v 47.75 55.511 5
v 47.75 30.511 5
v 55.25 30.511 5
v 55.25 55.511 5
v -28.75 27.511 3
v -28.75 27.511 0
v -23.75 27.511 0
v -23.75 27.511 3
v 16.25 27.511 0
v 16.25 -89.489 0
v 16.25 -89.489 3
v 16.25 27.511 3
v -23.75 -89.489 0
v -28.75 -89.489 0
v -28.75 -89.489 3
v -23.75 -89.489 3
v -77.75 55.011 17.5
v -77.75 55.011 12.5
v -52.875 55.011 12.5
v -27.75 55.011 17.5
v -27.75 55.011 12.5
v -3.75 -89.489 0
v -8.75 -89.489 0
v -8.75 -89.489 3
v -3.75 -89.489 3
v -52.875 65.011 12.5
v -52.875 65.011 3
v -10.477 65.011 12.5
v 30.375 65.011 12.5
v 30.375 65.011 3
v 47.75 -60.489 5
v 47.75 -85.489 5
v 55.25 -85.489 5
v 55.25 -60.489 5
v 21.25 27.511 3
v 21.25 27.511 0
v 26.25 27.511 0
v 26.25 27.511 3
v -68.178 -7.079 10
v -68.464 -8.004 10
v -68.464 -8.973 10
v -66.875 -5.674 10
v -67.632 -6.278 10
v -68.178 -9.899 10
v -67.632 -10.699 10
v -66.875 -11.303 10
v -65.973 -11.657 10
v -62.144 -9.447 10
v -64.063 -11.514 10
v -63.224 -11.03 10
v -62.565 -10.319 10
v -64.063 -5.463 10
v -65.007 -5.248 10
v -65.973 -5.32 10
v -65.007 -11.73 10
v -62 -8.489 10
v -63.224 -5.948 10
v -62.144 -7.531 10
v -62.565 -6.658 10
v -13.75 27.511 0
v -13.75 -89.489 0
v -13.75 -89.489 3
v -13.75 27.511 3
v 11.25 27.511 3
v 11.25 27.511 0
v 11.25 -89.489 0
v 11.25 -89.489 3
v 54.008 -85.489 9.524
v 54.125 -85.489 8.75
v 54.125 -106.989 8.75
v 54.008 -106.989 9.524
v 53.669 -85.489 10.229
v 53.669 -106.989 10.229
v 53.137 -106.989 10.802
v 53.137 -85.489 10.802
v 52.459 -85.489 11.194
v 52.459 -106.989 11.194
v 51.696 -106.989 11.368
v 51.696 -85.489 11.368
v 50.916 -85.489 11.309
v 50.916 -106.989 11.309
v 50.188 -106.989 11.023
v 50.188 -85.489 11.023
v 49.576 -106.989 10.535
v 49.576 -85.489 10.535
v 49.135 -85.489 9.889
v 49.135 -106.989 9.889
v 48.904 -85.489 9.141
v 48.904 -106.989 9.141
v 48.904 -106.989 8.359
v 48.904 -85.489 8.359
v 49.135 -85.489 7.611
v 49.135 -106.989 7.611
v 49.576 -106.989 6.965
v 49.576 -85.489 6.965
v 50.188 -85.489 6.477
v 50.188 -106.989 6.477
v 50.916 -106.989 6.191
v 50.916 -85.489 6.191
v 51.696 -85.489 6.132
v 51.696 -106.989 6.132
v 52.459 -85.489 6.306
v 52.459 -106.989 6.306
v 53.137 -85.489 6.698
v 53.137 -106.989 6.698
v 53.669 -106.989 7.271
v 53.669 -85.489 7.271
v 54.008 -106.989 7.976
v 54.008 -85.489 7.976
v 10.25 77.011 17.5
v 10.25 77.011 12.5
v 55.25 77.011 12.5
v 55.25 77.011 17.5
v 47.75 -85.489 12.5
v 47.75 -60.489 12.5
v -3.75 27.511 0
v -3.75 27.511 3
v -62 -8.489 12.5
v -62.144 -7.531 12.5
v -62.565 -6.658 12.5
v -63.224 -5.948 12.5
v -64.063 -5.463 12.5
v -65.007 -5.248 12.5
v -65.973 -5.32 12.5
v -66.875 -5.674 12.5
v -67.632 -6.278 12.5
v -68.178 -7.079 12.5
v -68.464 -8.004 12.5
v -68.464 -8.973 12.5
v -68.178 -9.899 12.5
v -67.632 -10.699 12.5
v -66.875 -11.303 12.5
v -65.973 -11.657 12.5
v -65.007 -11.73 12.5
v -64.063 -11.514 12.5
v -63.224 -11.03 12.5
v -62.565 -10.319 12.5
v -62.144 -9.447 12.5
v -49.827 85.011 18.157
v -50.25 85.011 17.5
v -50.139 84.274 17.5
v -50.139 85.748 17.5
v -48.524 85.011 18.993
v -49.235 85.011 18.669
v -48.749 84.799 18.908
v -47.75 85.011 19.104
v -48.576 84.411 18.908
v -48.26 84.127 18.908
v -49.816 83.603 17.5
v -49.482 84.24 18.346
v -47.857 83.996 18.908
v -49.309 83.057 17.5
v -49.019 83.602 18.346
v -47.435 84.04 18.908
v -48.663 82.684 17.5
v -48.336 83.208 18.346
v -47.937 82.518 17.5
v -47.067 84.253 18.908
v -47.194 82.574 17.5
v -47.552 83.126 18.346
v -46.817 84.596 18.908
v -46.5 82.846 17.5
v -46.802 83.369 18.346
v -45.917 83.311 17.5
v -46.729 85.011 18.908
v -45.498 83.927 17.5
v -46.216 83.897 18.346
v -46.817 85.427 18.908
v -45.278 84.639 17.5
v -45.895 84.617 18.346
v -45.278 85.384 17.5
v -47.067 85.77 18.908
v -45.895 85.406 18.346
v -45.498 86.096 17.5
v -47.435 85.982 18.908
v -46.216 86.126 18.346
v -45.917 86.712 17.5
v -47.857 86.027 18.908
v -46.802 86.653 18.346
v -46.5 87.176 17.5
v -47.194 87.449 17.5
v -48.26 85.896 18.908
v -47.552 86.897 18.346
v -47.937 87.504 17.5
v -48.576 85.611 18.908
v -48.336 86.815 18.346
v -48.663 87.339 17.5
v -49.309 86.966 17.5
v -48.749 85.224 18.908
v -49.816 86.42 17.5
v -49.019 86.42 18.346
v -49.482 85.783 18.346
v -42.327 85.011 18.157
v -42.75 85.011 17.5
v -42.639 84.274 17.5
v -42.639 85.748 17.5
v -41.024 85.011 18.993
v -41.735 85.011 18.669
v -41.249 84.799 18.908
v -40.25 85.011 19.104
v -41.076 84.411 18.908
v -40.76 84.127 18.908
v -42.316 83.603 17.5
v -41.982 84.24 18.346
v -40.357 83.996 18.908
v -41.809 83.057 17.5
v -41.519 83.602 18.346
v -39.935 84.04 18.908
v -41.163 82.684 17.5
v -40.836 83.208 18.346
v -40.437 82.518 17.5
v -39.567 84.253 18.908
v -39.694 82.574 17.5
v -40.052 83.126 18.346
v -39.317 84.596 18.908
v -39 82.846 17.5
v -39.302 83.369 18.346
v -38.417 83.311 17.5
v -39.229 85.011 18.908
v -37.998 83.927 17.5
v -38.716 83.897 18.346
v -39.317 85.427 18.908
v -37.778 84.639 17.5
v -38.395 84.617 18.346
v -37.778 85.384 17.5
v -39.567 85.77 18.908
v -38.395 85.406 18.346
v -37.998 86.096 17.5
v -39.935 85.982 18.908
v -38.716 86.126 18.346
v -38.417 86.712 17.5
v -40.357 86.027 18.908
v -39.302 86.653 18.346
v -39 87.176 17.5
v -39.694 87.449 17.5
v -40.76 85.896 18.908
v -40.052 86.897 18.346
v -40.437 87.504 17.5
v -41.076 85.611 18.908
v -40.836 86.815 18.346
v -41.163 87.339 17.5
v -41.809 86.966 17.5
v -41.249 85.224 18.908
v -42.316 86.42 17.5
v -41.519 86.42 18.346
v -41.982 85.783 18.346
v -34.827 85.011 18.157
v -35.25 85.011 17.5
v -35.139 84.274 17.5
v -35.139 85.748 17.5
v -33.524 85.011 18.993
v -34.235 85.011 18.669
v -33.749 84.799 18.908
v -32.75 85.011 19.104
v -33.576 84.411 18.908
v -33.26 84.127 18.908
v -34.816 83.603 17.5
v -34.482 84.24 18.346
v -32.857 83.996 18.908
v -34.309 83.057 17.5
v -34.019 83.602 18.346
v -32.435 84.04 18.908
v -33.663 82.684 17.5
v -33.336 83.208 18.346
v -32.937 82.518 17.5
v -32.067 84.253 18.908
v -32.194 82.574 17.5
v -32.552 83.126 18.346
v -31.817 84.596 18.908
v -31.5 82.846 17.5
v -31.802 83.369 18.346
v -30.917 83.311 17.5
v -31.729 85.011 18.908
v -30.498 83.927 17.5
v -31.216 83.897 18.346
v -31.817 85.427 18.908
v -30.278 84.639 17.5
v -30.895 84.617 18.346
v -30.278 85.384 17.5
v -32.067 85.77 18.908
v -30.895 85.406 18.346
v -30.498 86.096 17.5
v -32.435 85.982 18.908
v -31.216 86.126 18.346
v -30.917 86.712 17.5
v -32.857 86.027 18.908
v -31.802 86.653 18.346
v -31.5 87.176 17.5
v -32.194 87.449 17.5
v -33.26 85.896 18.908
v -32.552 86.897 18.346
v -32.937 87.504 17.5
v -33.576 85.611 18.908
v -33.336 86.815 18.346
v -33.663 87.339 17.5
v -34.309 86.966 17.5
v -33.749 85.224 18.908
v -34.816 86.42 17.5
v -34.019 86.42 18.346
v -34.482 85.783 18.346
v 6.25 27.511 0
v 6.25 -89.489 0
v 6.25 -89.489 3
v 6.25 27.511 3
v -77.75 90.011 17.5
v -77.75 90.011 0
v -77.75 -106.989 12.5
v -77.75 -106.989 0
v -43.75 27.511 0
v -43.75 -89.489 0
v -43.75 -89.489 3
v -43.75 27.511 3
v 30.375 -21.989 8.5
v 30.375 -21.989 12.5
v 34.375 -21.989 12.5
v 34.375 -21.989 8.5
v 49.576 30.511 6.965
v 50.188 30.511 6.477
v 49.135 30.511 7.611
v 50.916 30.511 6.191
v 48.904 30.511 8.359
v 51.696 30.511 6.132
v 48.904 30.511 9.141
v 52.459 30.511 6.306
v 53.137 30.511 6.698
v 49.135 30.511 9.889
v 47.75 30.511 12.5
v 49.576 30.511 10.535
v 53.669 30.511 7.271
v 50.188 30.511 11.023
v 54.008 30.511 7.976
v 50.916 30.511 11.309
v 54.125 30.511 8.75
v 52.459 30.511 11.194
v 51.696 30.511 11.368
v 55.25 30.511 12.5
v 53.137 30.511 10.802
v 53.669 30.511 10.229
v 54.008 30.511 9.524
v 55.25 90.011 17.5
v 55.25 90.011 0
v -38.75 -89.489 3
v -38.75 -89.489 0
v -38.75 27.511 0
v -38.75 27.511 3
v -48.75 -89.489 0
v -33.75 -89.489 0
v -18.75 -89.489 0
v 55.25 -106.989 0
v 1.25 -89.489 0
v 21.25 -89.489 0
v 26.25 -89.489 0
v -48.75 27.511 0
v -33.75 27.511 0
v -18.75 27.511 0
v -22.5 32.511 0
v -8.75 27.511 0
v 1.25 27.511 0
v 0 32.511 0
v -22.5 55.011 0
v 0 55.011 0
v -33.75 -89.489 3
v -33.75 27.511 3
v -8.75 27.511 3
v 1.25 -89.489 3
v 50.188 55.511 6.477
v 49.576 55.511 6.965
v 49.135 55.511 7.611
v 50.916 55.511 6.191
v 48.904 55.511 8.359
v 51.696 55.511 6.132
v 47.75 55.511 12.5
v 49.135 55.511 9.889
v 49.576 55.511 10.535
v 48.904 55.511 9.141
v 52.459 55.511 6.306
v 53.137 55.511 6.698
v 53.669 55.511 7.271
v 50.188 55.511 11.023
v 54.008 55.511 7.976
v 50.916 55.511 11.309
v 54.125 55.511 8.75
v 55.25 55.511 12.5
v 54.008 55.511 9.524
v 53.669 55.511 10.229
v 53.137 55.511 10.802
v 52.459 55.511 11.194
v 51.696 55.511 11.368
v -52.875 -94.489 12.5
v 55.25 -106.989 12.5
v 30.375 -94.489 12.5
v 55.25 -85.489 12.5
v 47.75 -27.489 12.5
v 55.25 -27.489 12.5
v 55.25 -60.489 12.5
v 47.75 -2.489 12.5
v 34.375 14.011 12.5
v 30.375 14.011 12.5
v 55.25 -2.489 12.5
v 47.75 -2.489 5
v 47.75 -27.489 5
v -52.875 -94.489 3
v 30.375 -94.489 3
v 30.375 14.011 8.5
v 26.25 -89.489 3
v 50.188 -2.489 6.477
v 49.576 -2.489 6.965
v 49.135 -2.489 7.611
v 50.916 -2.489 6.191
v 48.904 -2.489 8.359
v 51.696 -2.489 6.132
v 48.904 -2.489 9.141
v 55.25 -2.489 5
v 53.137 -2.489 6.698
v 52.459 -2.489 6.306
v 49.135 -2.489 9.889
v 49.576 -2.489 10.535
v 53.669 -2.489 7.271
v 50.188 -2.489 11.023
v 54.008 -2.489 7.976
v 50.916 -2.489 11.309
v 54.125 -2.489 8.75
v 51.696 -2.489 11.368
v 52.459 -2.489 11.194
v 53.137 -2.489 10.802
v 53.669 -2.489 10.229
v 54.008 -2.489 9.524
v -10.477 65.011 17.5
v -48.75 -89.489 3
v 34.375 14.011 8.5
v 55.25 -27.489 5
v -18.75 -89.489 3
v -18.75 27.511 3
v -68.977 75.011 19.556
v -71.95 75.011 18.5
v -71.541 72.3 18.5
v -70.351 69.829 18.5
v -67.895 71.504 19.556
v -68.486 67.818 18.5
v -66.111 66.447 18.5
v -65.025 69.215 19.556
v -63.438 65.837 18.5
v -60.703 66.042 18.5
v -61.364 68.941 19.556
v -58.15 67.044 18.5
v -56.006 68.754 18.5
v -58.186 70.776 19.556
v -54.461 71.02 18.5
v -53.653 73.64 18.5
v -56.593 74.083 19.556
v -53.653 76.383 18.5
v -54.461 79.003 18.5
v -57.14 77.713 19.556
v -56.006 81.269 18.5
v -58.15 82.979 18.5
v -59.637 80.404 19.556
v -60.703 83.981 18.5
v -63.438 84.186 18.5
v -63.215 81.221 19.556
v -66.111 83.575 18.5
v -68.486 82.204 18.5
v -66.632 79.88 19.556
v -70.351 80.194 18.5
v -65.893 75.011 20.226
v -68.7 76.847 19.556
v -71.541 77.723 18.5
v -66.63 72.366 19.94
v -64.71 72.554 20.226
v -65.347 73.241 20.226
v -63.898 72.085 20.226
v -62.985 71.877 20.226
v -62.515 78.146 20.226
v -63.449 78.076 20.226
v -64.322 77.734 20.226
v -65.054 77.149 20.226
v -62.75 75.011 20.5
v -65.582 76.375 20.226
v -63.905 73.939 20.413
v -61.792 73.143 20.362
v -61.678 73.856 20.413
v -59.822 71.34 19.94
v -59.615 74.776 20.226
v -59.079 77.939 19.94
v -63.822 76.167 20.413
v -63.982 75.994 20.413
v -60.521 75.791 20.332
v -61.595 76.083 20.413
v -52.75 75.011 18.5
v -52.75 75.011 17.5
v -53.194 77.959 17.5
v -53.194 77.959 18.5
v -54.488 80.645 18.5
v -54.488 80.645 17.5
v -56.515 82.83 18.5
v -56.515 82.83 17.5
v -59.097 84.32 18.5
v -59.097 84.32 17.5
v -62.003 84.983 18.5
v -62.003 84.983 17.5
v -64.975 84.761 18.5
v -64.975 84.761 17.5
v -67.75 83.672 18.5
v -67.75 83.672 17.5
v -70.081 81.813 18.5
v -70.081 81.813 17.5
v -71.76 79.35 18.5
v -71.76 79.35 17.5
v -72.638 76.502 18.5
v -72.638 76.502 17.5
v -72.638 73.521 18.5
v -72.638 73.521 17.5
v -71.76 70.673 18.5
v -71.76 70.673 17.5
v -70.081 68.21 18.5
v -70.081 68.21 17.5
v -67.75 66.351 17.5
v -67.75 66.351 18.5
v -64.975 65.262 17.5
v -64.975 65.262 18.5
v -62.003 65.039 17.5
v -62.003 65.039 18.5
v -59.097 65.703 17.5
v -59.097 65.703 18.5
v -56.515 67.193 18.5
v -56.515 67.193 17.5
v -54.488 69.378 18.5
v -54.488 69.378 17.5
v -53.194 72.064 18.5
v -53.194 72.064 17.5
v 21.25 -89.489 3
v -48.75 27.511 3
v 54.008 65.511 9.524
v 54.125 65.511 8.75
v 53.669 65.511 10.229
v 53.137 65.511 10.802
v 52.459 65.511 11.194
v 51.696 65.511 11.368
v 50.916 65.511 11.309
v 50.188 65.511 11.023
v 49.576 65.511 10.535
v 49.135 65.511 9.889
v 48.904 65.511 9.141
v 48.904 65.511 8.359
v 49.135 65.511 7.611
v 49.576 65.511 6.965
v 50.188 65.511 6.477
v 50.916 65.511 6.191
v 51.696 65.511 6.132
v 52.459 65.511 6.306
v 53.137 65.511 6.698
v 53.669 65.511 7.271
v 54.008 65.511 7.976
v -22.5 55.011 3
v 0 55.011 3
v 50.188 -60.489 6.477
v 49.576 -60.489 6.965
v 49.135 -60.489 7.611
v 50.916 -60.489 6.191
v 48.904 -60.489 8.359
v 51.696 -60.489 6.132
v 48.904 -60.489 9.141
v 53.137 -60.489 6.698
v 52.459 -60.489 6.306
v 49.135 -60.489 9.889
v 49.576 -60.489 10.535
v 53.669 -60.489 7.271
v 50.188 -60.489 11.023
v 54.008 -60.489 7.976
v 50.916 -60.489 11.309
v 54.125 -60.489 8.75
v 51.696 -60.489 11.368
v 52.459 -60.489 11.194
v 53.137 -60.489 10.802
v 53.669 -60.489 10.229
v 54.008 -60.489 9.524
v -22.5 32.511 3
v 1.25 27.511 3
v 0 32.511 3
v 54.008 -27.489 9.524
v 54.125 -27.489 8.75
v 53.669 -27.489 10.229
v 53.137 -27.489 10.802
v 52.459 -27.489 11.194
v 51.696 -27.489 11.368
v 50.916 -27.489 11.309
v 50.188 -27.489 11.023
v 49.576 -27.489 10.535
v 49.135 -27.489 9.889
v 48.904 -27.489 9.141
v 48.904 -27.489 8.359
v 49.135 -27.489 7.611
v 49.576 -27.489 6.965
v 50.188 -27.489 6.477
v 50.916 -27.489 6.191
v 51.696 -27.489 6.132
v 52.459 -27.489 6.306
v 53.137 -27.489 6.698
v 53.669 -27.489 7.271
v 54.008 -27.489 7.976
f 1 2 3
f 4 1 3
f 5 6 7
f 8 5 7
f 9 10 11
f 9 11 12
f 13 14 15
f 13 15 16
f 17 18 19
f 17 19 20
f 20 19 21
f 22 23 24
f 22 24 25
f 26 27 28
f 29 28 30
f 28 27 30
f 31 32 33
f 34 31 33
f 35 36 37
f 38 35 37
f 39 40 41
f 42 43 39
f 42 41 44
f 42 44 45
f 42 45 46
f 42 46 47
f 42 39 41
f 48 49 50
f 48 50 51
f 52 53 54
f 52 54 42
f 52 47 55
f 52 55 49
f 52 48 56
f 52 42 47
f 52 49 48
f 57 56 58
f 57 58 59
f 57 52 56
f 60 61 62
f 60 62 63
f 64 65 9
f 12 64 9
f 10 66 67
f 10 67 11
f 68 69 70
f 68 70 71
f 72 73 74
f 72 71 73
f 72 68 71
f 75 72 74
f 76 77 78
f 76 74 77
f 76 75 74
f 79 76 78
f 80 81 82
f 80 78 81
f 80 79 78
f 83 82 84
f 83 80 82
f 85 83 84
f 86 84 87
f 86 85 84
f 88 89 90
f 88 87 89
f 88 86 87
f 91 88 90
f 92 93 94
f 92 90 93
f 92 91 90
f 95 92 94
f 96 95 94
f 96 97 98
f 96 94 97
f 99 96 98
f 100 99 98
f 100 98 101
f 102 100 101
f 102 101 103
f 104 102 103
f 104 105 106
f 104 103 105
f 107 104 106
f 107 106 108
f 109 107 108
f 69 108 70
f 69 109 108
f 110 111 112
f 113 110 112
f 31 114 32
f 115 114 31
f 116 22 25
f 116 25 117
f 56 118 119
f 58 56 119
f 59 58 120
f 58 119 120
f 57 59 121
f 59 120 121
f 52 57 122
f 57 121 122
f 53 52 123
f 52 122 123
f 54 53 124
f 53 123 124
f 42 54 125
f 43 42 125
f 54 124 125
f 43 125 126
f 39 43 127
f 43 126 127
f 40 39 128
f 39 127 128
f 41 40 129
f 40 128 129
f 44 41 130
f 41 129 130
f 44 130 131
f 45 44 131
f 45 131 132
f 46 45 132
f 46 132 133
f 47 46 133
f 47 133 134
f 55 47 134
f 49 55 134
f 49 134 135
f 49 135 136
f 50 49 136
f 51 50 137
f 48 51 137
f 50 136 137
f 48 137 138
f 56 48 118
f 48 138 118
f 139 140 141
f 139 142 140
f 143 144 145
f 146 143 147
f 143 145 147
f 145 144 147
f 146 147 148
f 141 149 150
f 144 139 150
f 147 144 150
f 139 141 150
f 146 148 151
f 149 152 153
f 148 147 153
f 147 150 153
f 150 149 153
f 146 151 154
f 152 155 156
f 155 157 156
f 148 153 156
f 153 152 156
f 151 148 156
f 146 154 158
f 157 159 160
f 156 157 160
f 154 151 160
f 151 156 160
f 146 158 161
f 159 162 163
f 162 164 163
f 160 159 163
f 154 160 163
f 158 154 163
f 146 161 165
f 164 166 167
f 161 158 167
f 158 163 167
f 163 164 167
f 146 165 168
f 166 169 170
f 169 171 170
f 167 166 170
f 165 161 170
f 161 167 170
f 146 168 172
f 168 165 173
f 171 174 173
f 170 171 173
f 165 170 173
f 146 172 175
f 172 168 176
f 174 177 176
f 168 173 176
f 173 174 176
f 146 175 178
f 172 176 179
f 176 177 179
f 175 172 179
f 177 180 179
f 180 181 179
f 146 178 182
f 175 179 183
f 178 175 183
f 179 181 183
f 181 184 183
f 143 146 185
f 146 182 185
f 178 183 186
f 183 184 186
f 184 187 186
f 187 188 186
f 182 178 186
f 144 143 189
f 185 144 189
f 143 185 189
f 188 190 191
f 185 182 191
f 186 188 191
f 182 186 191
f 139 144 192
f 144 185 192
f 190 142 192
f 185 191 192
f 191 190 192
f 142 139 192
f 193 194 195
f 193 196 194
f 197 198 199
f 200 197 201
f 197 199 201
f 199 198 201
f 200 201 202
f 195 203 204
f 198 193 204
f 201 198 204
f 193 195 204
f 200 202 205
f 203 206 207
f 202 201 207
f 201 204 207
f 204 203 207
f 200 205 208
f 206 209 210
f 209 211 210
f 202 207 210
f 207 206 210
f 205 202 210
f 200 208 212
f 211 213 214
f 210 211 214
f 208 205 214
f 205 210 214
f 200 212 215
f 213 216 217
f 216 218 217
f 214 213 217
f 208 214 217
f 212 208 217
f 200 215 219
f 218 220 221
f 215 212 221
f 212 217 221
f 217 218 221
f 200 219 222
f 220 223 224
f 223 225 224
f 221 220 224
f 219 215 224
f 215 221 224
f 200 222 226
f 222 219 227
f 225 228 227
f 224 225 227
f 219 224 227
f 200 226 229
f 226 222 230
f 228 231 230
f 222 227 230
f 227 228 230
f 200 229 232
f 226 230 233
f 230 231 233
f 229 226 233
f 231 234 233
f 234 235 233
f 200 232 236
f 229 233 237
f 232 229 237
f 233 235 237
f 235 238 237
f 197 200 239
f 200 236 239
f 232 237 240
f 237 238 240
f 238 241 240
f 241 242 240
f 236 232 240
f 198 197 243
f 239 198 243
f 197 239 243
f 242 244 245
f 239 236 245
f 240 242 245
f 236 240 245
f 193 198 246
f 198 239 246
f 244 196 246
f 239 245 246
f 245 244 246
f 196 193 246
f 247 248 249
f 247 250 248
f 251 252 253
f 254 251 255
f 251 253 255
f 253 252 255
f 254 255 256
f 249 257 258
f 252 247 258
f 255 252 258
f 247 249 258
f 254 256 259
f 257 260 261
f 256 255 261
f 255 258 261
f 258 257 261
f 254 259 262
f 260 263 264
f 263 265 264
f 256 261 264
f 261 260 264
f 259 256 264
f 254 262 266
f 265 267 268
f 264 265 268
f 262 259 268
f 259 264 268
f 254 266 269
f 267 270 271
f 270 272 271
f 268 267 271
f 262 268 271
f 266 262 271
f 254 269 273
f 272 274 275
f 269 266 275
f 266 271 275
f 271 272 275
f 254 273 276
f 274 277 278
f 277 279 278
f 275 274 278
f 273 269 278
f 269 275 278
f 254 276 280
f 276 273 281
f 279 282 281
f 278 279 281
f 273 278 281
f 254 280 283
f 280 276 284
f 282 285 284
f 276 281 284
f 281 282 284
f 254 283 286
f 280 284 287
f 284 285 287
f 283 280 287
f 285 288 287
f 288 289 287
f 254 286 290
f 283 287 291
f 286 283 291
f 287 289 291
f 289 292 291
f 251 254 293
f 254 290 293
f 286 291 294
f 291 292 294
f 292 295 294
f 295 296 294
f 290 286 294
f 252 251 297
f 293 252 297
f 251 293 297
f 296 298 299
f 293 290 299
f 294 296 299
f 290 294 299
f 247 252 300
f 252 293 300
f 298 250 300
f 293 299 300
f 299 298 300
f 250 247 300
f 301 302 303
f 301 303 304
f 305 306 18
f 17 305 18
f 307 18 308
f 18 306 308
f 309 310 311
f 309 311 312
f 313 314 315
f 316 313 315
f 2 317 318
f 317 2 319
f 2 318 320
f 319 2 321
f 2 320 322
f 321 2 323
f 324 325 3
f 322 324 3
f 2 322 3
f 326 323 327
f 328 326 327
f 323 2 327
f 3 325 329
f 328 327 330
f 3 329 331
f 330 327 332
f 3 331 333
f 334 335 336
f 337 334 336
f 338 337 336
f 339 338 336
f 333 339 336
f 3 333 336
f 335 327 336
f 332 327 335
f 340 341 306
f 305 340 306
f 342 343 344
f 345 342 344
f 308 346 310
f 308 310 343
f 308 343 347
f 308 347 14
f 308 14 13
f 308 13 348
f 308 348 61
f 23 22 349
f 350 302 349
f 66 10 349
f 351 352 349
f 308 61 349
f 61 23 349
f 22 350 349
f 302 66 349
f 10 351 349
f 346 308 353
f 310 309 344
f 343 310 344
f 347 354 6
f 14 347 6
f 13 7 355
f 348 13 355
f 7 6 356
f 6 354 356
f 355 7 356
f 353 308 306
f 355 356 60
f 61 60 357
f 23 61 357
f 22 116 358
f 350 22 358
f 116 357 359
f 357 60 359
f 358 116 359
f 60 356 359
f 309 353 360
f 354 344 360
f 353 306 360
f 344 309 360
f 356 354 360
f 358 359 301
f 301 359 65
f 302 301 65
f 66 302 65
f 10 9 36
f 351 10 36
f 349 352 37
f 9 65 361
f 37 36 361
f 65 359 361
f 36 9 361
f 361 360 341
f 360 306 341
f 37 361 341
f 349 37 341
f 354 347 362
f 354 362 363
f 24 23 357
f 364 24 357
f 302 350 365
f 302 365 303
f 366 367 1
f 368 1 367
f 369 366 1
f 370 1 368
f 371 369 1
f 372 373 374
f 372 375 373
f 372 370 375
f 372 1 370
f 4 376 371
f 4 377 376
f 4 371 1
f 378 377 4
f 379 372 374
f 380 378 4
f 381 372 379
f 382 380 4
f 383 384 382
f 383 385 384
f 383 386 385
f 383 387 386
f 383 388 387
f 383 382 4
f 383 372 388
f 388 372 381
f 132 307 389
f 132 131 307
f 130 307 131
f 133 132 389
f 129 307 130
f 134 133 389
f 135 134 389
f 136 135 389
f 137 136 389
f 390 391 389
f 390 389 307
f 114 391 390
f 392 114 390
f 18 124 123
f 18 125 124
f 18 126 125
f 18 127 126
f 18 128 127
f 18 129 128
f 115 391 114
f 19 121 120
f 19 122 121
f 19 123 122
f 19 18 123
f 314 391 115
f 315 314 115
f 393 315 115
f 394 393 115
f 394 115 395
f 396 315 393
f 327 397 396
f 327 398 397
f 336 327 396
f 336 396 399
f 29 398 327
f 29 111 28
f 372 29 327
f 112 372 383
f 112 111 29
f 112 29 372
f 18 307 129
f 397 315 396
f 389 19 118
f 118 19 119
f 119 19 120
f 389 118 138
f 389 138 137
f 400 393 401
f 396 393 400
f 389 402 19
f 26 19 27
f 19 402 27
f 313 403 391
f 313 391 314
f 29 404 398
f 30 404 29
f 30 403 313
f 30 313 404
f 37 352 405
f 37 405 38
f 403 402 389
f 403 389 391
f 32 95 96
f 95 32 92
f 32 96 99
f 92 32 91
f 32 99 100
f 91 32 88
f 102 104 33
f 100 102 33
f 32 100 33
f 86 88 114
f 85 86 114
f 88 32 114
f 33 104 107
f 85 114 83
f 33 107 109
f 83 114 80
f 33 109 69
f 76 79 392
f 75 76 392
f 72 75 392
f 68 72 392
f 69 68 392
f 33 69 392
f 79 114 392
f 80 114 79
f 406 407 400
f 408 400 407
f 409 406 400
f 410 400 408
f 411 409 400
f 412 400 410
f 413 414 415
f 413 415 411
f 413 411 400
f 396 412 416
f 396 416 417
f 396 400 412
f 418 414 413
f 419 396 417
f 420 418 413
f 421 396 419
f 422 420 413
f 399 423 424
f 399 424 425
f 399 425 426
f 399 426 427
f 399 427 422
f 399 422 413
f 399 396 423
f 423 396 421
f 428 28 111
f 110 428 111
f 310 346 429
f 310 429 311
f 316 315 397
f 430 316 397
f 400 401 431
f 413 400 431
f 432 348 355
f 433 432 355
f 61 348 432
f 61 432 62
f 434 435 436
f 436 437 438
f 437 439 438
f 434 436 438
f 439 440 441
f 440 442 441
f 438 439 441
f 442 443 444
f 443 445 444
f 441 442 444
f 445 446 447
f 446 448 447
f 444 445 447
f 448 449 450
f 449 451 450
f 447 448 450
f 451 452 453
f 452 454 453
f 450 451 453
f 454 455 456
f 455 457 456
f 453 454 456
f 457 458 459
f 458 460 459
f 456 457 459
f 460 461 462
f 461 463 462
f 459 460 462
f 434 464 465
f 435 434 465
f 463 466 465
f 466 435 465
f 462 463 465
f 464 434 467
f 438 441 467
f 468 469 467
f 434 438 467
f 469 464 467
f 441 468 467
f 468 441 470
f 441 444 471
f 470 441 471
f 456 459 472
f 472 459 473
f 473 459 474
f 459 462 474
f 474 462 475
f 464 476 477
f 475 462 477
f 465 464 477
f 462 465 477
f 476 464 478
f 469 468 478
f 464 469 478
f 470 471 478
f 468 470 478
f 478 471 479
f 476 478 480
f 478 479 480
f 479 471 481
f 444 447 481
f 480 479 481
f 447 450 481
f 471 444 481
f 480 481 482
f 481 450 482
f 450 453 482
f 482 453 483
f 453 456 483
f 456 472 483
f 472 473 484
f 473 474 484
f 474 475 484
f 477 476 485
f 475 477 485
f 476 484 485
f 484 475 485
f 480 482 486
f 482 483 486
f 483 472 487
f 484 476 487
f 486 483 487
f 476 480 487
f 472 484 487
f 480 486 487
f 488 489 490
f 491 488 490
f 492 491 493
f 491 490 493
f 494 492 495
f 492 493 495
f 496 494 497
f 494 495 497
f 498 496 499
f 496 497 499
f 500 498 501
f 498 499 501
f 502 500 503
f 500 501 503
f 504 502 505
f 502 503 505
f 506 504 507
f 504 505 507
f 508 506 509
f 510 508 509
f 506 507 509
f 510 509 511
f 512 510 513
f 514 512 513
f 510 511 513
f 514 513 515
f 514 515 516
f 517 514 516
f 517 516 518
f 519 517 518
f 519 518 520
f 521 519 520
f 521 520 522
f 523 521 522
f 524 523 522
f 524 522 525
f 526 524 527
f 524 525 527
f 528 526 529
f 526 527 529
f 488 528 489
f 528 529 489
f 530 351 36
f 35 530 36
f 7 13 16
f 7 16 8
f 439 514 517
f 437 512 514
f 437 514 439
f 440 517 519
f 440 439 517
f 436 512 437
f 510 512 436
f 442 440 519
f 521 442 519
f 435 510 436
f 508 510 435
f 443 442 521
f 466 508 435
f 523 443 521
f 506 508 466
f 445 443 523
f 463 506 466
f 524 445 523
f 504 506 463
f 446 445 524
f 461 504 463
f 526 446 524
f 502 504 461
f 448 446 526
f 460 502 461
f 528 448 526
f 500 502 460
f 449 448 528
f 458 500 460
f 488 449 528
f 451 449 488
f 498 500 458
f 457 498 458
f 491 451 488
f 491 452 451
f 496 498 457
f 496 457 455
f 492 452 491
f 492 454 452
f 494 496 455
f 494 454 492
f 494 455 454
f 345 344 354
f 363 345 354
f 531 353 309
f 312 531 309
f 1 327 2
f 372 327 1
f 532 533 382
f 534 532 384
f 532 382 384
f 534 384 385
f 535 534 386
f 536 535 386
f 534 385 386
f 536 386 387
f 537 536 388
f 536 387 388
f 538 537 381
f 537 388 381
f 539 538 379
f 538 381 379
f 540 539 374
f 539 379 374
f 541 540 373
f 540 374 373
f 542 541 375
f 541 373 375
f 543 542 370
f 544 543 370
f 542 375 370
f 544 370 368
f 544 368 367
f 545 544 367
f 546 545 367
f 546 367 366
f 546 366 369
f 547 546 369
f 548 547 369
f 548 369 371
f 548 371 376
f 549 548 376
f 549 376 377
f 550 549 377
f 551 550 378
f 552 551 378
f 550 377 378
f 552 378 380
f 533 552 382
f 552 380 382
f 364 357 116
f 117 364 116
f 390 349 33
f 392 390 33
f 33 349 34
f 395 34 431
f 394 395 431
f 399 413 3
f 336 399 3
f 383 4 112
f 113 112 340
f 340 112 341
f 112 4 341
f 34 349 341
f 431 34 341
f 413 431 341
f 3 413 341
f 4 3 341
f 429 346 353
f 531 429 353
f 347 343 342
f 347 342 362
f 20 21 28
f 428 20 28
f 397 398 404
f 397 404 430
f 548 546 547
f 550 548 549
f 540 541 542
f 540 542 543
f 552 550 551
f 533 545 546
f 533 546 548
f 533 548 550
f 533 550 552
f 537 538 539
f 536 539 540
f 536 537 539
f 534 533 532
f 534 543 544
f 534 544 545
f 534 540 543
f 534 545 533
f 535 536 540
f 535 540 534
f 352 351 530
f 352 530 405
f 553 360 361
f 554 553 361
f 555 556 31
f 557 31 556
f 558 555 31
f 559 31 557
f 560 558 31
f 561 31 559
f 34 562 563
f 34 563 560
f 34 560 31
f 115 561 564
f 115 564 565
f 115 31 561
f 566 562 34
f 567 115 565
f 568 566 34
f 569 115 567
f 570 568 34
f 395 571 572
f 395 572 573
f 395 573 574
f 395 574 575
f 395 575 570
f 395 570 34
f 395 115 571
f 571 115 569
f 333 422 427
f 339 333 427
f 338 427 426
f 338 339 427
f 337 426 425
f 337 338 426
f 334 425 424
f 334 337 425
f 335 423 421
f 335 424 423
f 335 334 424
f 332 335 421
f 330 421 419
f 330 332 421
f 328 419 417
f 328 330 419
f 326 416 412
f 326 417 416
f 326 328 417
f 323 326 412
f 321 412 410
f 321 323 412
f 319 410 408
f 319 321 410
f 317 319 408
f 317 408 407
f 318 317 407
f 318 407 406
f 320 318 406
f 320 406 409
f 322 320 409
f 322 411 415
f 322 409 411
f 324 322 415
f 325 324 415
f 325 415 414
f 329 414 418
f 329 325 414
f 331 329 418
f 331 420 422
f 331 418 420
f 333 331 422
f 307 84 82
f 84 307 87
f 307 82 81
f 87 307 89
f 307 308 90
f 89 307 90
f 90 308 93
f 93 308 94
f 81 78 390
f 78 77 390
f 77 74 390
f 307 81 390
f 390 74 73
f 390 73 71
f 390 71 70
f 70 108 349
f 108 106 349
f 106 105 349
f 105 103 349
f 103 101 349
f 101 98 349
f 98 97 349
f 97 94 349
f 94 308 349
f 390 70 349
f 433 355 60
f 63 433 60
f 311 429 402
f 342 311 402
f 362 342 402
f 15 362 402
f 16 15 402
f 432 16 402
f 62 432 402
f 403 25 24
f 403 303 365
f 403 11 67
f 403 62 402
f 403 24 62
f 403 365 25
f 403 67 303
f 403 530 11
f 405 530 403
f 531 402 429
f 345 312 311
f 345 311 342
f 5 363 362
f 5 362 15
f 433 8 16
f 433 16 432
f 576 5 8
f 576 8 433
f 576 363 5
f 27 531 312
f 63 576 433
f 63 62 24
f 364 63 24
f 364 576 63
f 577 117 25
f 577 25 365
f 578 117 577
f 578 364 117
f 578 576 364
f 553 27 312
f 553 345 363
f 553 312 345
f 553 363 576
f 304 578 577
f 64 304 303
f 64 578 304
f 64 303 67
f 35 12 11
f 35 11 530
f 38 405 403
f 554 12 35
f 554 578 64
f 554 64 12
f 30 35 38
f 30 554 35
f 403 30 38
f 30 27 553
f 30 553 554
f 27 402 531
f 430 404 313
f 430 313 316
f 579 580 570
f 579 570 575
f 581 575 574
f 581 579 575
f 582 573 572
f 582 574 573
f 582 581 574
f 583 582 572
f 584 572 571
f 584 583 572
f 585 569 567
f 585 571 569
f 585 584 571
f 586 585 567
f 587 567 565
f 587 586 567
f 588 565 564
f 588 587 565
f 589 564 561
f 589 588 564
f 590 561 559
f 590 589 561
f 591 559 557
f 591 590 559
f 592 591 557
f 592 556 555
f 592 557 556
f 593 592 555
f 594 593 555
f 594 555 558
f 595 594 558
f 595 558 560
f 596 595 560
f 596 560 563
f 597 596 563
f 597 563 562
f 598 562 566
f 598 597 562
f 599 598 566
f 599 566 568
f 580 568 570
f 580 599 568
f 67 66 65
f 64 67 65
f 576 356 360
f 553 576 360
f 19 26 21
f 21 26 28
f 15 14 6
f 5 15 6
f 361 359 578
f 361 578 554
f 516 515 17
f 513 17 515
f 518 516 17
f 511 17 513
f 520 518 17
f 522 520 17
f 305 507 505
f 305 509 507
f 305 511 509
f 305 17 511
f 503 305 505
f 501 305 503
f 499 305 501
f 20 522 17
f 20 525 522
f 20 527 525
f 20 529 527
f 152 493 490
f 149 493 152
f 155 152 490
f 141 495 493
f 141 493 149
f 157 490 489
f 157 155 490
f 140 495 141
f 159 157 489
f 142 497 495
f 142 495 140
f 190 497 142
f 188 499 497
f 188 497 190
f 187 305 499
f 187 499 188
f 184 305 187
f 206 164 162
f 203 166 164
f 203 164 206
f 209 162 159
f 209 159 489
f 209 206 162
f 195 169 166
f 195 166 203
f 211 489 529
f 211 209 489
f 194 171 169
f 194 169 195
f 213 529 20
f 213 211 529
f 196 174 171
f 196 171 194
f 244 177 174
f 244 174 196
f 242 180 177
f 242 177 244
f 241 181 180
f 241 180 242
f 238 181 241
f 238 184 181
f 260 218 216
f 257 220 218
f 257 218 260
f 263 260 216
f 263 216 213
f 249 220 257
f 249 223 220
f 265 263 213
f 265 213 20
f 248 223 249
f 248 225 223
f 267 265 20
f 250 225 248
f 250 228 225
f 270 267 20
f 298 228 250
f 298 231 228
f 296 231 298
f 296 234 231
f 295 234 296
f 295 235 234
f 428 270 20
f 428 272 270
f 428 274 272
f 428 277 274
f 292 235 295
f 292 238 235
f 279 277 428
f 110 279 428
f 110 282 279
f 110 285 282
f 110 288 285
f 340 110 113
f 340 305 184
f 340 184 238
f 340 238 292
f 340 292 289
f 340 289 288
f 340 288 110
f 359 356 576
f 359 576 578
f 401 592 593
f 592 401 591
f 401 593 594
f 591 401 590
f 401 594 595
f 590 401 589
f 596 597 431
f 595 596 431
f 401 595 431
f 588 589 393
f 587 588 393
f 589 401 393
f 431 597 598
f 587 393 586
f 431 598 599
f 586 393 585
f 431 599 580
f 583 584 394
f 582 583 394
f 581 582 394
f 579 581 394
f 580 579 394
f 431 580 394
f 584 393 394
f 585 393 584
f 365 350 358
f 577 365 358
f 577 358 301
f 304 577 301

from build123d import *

# Parameters (mm, degrees)
F0_W           = 133
F0_H           = 197
F0_W_2         = 83.25
F0_H_2         = 159.5
F0_W_3         = 5
F0_H_3         = 117
F0_W_4         = 22.5
F0_H_4         = 22.5
F1_DEPTH       = 3
F2_DEPTH       = 12.5
F3_R           = 3.25
F4_DEPTH       = 2.5
F5_DEPTH       = 5
F6_R           = 10
F7_DEPTH       = 1
F16_W          = 7.5
F16_H          = 25
F17_DEPTH      = 7.5
F18_R          = 2.625
F19_DEPTH      = 162.501
F19_DEPTH_BACK = 10
F16_W_2        = 4
F16_H_2        = 36
F20_DEPTH      = 4


with BuildPart() as f1:
    # F0 (on Top) → F1 (new body)
    with BuildSketch(Plane.XY):
        with Locations((-11.25, -8.4886514246)):
            Rectangle(F0_W, F0_H)
        with Locations((-11.25, -14.7386514246)):
            Rectangle(F0_W_2, F0_H_2, mode=Mode.SUBTRACT)
        with Locations((-11.25, -14.7386514246)):
            Rectangle(F0_W_2, F0_H_2)
        with Locations((-46.25, -30.9886514246)):
            Rectangle(F0_W_3, F0_H_3, mode=Mode.SUBTRACT)
        with Locations((-36.25, -30.9886514246)):
            Rectangle(F0_W_3, F0_H_3, mode=Mode.SUBTRACT)
        with Locations((-26.25, -30.9886514246)):
            Rectangle(F0_W_3, F0_H_3, mode=Mode.SUBTRACT)
        with Locations((-16.25, -30.9886514246)):
            Rectangle(F0_W_3, F0_H_3, mode=Mode.SUBTRACT)
        with Locations((-6.25, -30.9886514246)):
            Rectangle(F0_W_3, F0_H_3, mode=Mode.SUBTRACT)
        with Locations((3.75, -30.9886514246)):
            Rectangle(F0_W_3, F0_H_3, mode=Mode.SUBTRACT)
        with Locations((13.75, -30.9886514246)):
            Rectangle(F0_W_3, F0_H_3, mode=Mode.SUBTRACT)
        with Locations((23.75, -30.9886514246)):
            Rectangle(F0_W_3, F0_H_3, mode=Mode.SUBTRACT)
        with Locations((-11.25, 43.7613485754)):
            Rectangle(F0_W_4, F0_H_4, mode=Mode.SUBTRACT)
    extrude(amount=F1_DEPTH)

    # F0 (on Top) → F2 (join)
    with BuildSketch(Plane.XY):
        with Locations((-11.25, -8.4886514246)):
            Rectangle(F0_W, F0_H)
        with Locations((-11.25, -14.7386514246)):
            Rectangle(F0_W_2, F0_H_2, mode=Mode.SUBTRACT)
    extrude(amount=F2_DEPTH)

    # F3 (on face) → F4 (cut)
    with BuildSketch(Plane.XY.offset(12.5)):
        with Locations((-65.25, -8.4886514246)):
            Circle(F3_R)
        Polygon((-77.75, 90.0113485754), (-77.75, 55.0113485754), (-52.875, 55.0113485754), (-52.875, 65.0113485754), (-10.4772727273, 65.0113485754), (10.25, 77.0113485754), (55.25, 77.0113485754), (55.25, 90.0113485754), align=None)
    extrude(amount=-F4_DEPTH, mode=Mode.SUBTRACT)

    # F3 (on face) + F4_face (on face) → F5 (join)
    with BuildSketch(Plane.XY.offset(12.5)):
        Polygon((-77.75, 90.0113485754), (-77.75, 55.0113485754), (-52.875, 55.0113485754), (-52.875, 65.0113485754), (-10.4772727273, 65.0113485754), (10.25, 77.0113485754), (55.25, 77.0113485754), (55.25, 90.0113485754), align=None)
        Polygon((-52.875, 65.0113485754), (-52.875, 55.0113485754), (-27.75, 55.0113485754), (-10.4772727273, 65.0113485754), align=None)
    with BuildSketch(Plane(origin=(-24.6626652531, 77.5848918874, 10), x_dir=(1, 0, 0), z_dir=(0, 0, 1))):
        Polygon((-53.0873347469, 12.426456688), (-53.0873347469, -22.573543312), (-28.2123347469, -22.573543312), (-28.2123347469, -12.573543312), (14.1853925258, -12.573543312), (34.9126652531, -0.573543312), (79.9126652531, -0.573543312), (79.9126652531, 12.426456688), align=None)
    extrude(amount=F5_DEPTH)

    # F6 (on face) → F7 (join)
    with BuildSketch(Plane.XY.offset(17.5)):
        with Locations((-62.75, 75.0113485754)):
            Circle(F6_R)
    extrude(amount=F7_DEPTH)

    # F9 (on offset) → F10 (revolve)
    with BuildSketch(Plane.XZ.offset(-75.0113485754)):
        with BuildLine():
            ThreePointArc((-62.75, 20.5), (-67.445725321, 19.9403364768), (-71.95, 18.5))
            Line((-71.95, 18.5), (-62.75, 18.5))
            Line((-62.75, 18.5), (-62.75, 20.5))
        make_face()
    revolve(axis=Axis((-62.75, 75.0113485754, 19.5), (0, 0, 1)))

    # F12 (on offset) → F13 (revolve)
    with BuildSketch(Plane.XZ.offset(-85.0113485754)):
        with BuildLine():
            ThreePointArc((-47.75, 19.1043560763), (-49.2352574204, 18.6687696943), (-50.25, 17.5))
            Line((-50.25, 17.5), (-47.75, 17.5))
            Line((-47.75, 17.5), (-47.75, 19.1043560763))
        make_face()
    revolve(axis=Axis((-47.75, 85.0113485754, 18.3021780381), (0, 0, 1)))

    # F12 (on offset) → F14 (revolve)
    with BuildSketch(Plane.XZ.offset(-85.0113485754)):
        with BuildLine():
            ThreePointArc((-40.25, 19.1043560763), (-41.7352574204, 18.6687696943), (-42.75, 17.5))
            Line((-42.75, 17.5), (-40.25, 17.5))
            Line((-40.25, 17.5), (-40.25, 19.1043560763))
        make_face()
    revolve(axis=Axis((-40.25, 85.0113485754, 18.3021780381), (0, 0, 1)))

    # F12 (on offset) → F15 (revolve)
    with BuildSketch(Plane.XZ.offset(-85.0113485754)):
        with BuildLine():
            ThreePointArc((-32.75, 19.1043560763), (-34.2352574204, 18.6687696943), (-35.25, 17.5))
            Line((-35.25, 17.5), (-32.75, 17.5))
            Line((-32.75, 17.5), (-32.75, 19.1043560763))
        make_face()
    revolve(axis=Axis((-32.75, 85.0113485754, 18.3021780381), (0, 0, 1)))

    # F16 (on face) → F17 (cut)
    with BuildSketch(Plane.XY.offset(12.5)):
        with Locations((51.5, 43.0113485754)):
            Rectangle(F16_W, F16_H)
        with Locations((51.5, -14.9886514246)):
            Rectangle(F16_W, F16_H)
        with Locations((51.5, -72.9886514246)):
            Rectangle(F16_W, F16_H)
    extrude(amount=-F17_DEPTH, mode=Mode.SUBTRACT)

    # F18 (on face) → F19 (cut, two sides)
    with BuildSketch(Plane.XZ.offset(-55.5113485754)) as f19_sk:
        with Locations((51.5, 8.75)):
            Circle(F18_R)
    extrude(amount=F19_DEPTH, mode=Mode.SUBTRACT)
    extrude(f19_sk.sketch, amount=-F19_DEPTH_BACK, mode=Mode.SUBTRACT)

    # F16 (on face) → F20 (cut)
    with BuildSketch(Plane.XY.offset(12.5)):
        with Locations((32.375, -3.9886514246)):
            Rectangle(F16_W_2, F16_H_2)
    extrude(amount=-F20_DEPTH, mode=Mode.SUBTRACT)


solid = f1.part
